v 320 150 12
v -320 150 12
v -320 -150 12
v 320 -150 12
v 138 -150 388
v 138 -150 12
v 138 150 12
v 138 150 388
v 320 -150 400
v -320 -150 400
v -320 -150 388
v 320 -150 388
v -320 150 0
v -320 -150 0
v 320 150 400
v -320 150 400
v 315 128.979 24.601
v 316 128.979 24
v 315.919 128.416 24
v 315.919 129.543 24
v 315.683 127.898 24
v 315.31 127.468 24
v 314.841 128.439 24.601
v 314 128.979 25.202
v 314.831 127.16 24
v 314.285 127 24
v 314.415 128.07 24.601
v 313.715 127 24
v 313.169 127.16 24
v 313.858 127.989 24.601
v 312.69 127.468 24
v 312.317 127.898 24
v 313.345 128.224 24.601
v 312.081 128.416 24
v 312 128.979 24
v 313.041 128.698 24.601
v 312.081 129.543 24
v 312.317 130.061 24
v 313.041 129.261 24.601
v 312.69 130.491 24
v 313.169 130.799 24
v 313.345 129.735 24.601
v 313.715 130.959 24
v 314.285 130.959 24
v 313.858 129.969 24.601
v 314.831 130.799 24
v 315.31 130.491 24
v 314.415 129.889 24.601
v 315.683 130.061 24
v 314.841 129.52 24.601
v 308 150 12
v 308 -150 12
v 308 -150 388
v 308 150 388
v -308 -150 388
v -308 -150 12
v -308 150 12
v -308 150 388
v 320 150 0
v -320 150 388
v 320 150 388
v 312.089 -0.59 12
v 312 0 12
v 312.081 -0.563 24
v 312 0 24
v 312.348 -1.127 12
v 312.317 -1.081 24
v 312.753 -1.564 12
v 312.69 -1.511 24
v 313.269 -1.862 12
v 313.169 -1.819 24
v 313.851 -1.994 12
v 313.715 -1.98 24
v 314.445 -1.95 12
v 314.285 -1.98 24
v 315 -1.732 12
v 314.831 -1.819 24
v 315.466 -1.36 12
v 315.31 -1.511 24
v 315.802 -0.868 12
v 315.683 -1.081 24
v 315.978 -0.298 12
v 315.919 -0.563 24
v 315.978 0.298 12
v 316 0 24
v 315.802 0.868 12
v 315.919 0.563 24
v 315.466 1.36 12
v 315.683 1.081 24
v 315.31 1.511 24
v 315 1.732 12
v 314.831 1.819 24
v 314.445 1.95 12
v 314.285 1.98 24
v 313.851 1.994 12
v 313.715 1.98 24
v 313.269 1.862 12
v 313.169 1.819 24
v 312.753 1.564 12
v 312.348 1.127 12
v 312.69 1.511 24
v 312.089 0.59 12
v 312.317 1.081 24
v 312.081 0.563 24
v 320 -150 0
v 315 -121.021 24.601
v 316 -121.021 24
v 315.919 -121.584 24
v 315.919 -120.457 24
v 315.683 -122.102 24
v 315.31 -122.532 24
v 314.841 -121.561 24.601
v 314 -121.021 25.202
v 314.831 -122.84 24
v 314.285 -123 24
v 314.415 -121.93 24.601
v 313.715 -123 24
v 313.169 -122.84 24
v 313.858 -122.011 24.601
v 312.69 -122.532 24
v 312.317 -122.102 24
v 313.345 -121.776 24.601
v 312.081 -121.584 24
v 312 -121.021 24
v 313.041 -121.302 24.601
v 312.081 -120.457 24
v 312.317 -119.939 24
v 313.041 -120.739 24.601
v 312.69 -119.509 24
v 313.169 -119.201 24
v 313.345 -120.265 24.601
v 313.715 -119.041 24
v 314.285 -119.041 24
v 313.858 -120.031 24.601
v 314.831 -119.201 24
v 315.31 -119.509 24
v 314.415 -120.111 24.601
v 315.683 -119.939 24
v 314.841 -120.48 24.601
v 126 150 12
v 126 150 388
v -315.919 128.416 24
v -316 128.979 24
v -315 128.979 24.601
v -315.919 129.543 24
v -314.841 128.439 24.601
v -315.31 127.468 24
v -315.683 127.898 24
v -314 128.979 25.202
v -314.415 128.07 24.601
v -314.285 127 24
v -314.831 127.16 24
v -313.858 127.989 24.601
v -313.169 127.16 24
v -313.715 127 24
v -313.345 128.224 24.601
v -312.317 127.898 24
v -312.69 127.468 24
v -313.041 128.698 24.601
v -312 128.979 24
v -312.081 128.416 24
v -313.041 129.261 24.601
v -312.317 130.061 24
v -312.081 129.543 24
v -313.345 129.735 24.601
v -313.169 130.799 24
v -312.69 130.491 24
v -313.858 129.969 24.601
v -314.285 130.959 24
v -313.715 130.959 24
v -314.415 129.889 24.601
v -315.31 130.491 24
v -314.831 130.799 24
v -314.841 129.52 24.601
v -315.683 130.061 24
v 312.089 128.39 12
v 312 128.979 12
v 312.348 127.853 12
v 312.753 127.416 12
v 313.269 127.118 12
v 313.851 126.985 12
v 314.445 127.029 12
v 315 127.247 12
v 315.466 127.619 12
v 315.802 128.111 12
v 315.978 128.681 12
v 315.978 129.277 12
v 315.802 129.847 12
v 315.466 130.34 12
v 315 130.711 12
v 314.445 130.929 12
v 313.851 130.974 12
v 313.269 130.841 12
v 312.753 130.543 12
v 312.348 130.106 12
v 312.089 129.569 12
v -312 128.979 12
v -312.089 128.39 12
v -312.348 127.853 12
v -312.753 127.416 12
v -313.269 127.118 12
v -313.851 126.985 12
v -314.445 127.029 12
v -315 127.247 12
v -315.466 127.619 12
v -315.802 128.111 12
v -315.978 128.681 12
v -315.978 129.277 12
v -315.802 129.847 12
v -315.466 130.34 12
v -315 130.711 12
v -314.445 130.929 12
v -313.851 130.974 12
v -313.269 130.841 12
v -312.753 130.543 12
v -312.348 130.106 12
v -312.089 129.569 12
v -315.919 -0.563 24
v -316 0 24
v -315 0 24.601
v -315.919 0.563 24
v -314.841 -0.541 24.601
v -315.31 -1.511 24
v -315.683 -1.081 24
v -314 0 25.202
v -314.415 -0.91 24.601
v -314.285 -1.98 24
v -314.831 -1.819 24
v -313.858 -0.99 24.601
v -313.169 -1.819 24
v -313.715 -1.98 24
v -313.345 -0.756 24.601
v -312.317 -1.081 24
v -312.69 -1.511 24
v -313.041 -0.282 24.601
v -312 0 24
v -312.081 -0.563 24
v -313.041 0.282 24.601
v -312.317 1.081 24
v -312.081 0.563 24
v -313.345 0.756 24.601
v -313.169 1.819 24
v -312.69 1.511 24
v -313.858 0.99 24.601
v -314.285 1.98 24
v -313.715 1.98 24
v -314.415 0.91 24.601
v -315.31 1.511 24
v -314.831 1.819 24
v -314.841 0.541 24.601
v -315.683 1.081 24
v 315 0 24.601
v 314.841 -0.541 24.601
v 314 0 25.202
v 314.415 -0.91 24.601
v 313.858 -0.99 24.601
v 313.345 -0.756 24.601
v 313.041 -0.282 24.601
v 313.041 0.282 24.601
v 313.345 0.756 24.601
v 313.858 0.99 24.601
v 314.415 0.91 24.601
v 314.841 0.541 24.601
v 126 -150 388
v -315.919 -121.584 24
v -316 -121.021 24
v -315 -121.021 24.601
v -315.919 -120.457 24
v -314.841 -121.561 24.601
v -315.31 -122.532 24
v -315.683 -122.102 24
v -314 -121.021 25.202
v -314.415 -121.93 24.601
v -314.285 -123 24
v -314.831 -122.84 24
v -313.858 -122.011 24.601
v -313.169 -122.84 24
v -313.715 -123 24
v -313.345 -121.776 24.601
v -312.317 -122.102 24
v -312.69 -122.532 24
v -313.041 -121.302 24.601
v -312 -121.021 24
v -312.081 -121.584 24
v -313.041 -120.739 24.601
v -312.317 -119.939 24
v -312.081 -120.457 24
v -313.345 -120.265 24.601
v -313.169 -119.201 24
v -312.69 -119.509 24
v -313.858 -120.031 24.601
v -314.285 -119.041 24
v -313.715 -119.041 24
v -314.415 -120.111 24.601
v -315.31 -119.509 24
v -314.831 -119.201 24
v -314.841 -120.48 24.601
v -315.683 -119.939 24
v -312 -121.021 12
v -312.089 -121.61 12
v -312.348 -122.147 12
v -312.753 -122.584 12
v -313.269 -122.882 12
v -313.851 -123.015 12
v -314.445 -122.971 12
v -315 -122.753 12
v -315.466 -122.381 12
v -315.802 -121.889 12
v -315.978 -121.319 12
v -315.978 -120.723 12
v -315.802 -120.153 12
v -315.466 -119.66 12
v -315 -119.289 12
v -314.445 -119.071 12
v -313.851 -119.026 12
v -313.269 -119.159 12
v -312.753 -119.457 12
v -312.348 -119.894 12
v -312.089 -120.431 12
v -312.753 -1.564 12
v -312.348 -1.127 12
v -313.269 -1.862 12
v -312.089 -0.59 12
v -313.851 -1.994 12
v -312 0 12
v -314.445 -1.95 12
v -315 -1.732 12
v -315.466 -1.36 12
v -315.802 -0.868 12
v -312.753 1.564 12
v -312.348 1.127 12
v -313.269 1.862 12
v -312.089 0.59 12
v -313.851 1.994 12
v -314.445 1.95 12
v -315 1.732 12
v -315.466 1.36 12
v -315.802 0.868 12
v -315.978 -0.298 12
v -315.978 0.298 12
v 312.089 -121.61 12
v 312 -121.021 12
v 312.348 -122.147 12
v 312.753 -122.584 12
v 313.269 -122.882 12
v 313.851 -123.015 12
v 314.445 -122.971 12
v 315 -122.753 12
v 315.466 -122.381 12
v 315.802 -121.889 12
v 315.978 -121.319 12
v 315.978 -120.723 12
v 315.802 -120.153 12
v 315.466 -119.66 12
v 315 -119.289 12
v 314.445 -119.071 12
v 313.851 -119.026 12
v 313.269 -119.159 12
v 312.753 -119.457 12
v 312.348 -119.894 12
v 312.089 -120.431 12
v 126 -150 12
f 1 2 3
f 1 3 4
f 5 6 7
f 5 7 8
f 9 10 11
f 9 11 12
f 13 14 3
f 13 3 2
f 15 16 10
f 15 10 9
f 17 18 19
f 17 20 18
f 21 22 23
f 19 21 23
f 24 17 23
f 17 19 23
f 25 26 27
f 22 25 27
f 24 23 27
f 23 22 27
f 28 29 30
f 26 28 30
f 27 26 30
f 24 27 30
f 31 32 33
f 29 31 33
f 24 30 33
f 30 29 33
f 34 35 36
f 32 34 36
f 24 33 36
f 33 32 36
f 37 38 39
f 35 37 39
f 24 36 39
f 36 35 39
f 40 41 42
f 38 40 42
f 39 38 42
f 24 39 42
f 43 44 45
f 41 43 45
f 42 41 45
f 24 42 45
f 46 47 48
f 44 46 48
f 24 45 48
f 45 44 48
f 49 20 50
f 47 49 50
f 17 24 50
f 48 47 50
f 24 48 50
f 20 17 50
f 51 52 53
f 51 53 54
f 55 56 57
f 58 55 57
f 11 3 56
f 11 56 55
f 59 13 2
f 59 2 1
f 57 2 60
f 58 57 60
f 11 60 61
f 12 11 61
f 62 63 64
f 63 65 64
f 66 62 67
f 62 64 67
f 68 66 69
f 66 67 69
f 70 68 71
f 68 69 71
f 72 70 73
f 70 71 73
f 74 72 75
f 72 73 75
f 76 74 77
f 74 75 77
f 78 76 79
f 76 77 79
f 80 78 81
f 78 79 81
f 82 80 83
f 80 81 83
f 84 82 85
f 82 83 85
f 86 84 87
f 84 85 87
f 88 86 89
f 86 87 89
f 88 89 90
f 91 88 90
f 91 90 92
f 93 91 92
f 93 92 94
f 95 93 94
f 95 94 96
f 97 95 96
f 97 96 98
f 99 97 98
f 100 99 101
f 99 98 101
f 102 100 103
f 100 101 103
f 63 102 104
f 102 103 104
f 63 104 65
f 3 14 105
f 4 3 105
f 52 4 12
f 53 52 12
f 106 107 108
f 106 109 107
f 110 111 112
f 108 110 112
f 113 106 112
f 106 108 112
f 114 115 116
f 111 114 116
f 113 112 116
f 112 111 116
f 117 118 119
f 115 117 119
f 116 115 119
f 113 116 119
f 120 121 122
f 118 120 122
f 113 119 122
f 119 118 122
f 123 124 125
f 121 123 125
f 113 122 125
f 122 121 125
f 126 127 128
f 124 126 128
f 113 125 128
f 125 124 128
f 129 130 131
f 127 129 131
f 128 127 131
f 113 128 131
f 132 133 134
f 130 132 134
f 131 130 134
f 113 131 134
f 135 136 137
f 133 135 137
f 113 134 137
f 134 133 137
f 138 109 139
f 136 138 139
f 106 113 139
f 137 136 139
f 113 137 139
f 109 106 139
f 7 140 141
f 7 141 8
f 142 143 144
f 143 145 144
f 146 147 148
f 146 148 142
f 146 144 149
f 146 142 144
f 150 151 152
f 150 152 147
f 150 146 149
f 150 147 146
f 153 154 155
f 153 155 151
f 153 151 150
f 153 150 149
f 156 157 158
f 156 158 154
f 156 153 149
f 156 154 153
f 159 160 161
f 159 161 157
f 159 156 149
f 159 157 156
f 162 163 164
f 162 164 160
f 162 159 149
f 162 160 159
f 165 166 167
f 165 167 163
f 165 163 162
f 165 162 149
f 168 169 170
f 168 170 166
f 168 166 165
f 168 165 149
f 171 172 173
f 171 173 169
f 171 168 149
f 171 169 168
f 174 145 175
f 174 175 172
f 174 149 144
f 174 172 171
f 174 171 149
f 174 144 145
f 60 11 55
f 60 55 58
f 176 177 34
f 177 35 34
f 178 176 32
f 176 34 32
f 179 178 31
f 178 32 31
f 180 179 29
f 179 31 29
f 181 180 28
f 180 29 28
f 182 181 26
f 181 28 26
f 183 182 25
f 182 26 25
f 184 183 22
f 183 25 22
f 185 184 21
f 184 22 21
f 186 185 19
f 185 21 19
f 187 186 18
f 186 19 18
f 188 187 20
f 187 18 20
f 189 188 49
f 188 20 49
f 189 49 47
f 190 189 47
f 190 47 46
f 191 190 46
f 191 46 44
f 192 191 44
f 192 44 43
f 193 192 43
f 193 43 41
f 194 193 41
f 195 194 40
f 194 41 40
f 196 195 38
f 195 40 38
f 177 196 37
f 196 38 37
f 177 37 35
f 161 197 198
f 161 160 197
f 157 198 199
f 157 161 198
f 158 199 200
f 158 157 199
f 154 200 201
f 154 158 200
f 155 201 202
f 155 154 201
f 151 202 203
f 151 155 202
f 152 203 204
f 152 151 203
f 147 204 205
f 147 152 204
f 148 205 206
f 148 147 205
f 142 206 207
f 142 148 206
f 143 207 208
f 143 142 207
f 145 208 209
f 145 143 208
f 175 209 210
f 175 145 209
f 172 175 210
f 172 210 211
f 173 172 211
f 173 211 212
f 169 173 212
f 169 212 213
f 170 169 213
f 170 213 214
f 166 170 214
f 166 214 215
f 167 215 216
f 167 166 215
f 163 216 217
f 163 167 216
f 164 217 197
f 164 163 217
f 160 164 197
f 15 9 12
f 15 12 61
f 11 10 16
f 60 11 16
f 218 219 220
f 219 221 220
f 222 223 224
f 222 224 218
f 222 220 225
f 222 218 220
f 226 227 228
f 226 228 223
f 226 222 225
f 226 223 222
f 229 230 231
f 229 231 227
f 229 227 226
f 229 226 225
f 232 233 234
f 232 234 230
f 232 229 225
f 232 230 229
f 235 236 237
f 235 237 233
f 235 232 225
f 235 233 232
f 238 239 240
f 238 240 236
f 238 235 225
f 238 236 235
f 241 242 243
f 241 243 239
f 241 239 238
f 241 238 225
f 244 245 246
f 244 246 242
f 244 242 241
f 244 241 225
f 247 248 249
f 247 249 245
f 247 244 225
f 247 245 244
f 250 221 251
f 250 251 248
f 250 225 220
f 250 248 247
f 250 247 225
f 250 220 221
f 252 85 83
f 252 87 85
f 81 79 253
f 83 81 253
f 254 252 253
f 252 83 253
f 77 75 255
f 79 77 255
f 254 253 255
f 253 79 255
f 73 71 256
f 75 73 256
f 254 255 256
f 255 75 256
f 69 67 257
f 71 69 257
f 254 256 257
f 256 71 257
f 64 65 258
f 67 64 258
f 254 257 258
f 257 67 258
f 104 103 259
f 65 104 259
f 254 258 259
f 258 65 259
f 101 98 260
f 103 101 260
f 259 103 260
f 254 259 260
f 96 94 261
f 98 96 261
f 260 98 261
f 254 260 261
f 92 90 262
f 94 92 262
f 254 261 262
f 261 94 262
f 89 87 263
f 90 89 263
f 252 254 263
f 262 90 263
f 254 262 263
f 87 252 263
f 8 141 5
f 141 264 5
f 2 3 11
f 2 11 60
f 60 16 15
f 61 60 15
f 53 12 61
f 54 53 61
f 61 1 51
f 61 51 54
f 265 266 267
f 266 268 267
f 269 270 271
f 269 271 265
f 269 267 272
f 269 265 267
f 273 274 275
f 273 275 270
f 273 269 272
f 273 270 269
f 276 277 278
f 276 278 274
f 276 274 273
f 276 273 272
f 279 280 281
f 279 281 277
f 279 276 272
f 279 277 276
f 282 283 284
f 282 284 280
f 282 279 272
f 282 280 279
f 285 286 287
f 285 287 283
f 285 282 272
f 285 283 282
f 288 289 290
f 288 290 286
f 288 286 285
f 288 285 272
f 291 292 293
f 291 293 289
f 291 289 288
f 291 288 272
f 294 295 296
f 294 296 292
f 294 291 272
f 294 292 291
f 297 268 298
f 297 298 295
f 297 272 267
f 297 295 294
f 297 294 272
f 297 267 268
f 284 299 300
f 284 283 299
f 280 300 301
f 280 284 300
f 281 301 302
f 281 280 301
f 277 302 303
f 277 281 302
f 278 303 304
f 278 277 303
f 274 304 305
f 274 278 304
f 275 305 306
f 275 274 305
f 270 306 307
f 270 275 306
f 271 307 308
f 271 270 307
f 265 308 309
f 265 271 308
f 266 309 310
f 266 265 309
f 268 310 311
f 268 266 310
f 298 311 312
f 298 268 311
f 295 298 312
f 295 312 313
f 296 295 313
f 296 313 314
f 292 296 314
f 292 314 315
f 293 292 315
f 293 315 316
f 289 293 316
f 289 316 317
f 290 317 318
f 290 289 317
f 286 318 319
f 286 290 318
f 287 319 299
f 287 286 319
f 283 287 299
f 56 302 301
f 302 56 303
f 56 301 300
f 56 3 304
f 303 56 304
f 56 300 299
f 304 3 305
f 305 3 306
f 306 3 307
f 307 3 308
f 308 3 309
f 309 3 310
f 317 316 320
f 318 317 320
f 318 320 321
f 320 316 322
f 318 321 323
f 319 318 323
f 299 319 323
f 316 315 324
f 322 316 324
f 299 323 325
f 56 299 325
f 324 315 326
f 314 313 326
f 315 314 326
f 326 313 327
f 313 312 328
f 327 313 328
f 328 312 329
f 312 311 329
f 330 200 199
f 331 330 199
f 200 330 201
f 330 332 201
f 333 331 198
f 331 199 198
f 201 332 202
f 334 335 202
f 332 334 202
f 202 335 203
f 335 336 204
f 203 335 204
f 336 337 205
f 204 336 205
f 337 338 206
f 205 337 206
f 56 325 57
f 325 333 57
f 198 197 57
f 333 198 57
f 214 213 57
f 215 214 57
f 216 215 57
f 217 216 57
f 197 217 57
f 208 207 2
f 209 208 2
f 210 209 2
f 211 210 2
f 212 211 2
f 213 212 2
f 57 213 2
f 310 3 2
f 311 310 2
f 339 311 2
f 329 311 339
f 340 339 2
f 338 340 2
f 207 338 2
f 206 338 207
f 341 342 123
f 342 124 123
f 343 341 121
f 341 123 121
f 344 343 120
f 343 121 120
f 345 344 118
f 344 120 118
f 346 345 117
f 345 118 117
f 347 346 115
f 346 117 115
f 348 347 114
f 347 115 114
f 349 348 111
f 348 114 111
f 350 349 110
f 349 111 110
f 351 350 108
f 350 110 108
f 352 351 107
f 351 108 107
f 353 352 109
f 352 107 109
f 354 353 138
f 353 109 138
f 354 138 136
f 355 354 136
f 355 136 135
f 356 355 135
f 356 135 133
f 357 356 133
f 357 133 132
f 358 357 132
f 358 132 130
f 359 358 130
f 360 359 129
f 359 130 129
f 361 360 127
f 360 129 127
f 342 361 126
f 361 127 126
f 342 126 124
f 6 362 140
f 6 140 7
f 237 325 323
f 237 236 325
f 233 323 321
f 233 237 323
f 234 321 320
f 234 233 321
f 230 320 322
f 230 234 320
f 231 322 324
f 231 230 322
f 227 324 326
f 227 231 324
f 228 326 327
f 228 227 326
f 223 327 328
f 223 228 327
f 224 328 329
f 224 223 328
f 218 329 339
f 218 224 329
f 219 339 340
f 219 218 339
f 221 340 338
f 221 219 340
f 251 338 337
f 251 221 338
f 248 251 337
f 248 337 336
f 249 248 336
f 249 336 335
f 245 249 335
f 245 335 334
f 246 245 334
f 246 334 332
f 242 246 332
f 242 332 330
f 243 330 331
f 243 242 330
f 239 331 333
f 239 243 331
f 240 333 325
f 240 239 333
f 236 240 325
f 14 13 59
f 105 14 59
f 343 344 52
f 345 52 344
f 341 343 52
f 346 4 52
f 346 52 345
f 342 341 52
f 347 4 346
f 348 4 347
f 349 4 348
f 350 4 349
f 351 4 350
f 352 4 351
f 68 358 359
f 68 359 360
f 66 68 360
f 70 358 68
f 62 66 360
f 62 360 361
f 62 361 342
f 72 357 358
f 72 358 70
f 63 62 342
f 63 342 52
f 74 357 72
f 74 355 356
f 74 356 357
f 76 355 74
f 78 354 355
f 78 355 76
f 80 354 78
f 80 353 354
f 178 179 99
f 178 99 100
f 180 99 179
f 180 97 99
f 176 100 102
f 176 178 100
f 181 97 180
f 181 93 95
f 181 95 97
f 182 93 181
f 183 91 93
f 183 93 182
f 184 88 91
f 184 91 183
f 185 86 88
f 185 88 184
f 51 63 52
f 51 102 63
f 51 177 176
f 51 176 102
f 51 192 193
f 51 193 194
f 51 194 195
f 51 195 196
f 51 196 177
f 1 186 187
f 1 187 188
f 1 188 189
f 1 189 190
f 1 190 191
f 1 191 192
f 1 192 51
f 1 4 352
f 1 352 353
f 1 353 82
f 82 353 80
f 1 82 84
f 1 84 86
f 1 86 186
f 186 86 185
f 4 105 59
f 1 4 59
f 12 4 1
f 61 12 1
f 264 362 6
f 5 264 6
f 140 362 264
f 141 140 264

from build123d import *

# Parameters (mm, degrees)
F0_W      = 640
F0_H      = 300
F1_DEPTH  = 12
F2_W      = 300
F2_H      = 376
F3_DEPTH  = 12
F5_D      = 4
F5_DEPTH  = 12
F5_TIP    = 1.2017212381
F9_W      = 12
F9_H      = 376
F10_DEPTH = 150


with BuildPart() as f1:
    # F0 (on Top) → F1 (new body)
    with BuildSketch(Plane.XY):
        Rectangle(F0_W, F0_H)
    extrude(amount=F1_DEPTH)


with BuildPart() as f3:
    # F2 (on face) → F3 (new body)
    with BuildSketch(Plane.YZ.offset(320)):
        with Locations((0, 200)):
            Rectangle(F2_W, F2_H)
    extrude(amount=-F3_DEPTH)

    # F5
    with Locations(Plane(origin=(0, 0, 12), x_dir=(1, 0, 0), z_dir=(0, 0, -1))):
        with Locations((314, 121.0207406604), (314, 0), (314, -128.9792593396)):
            Hole(F5_D / 2, depth=F5_DEPTH)
            with Locations((0, 0, -(F5_DEPTH + F5_TIP / 2))):  # 118° drill point
                Cone(0, F5_D / 2, F5_TIP, mode=Mode.SUBTRACT)


with BuildPart() as f7_1:
    # F7: instance of F3
    add(f3.part.mirror(Plane.YZ))


with BuildPart() as f8_1:
    # F8: instance of F1
    add(f1.part.mirror(Plane(origin=(314, -0.014037233, 200), x_dir=(1, 0, 0), z_dir=(0, 0, -1))))


with BuildPart() as f10:
    # F9 (on Front) → F10 (new body, symmetric)
    with BuildSketch(Plane.XZ):
        with Locations((132, 200)):
            Rectangle(F9_W, F9_H)
    extrude(amount=F10_DEPTH, both=True)


solid = Compound([f1.part, f3.part, f7_1.part, f8_1.part, f10.part])
